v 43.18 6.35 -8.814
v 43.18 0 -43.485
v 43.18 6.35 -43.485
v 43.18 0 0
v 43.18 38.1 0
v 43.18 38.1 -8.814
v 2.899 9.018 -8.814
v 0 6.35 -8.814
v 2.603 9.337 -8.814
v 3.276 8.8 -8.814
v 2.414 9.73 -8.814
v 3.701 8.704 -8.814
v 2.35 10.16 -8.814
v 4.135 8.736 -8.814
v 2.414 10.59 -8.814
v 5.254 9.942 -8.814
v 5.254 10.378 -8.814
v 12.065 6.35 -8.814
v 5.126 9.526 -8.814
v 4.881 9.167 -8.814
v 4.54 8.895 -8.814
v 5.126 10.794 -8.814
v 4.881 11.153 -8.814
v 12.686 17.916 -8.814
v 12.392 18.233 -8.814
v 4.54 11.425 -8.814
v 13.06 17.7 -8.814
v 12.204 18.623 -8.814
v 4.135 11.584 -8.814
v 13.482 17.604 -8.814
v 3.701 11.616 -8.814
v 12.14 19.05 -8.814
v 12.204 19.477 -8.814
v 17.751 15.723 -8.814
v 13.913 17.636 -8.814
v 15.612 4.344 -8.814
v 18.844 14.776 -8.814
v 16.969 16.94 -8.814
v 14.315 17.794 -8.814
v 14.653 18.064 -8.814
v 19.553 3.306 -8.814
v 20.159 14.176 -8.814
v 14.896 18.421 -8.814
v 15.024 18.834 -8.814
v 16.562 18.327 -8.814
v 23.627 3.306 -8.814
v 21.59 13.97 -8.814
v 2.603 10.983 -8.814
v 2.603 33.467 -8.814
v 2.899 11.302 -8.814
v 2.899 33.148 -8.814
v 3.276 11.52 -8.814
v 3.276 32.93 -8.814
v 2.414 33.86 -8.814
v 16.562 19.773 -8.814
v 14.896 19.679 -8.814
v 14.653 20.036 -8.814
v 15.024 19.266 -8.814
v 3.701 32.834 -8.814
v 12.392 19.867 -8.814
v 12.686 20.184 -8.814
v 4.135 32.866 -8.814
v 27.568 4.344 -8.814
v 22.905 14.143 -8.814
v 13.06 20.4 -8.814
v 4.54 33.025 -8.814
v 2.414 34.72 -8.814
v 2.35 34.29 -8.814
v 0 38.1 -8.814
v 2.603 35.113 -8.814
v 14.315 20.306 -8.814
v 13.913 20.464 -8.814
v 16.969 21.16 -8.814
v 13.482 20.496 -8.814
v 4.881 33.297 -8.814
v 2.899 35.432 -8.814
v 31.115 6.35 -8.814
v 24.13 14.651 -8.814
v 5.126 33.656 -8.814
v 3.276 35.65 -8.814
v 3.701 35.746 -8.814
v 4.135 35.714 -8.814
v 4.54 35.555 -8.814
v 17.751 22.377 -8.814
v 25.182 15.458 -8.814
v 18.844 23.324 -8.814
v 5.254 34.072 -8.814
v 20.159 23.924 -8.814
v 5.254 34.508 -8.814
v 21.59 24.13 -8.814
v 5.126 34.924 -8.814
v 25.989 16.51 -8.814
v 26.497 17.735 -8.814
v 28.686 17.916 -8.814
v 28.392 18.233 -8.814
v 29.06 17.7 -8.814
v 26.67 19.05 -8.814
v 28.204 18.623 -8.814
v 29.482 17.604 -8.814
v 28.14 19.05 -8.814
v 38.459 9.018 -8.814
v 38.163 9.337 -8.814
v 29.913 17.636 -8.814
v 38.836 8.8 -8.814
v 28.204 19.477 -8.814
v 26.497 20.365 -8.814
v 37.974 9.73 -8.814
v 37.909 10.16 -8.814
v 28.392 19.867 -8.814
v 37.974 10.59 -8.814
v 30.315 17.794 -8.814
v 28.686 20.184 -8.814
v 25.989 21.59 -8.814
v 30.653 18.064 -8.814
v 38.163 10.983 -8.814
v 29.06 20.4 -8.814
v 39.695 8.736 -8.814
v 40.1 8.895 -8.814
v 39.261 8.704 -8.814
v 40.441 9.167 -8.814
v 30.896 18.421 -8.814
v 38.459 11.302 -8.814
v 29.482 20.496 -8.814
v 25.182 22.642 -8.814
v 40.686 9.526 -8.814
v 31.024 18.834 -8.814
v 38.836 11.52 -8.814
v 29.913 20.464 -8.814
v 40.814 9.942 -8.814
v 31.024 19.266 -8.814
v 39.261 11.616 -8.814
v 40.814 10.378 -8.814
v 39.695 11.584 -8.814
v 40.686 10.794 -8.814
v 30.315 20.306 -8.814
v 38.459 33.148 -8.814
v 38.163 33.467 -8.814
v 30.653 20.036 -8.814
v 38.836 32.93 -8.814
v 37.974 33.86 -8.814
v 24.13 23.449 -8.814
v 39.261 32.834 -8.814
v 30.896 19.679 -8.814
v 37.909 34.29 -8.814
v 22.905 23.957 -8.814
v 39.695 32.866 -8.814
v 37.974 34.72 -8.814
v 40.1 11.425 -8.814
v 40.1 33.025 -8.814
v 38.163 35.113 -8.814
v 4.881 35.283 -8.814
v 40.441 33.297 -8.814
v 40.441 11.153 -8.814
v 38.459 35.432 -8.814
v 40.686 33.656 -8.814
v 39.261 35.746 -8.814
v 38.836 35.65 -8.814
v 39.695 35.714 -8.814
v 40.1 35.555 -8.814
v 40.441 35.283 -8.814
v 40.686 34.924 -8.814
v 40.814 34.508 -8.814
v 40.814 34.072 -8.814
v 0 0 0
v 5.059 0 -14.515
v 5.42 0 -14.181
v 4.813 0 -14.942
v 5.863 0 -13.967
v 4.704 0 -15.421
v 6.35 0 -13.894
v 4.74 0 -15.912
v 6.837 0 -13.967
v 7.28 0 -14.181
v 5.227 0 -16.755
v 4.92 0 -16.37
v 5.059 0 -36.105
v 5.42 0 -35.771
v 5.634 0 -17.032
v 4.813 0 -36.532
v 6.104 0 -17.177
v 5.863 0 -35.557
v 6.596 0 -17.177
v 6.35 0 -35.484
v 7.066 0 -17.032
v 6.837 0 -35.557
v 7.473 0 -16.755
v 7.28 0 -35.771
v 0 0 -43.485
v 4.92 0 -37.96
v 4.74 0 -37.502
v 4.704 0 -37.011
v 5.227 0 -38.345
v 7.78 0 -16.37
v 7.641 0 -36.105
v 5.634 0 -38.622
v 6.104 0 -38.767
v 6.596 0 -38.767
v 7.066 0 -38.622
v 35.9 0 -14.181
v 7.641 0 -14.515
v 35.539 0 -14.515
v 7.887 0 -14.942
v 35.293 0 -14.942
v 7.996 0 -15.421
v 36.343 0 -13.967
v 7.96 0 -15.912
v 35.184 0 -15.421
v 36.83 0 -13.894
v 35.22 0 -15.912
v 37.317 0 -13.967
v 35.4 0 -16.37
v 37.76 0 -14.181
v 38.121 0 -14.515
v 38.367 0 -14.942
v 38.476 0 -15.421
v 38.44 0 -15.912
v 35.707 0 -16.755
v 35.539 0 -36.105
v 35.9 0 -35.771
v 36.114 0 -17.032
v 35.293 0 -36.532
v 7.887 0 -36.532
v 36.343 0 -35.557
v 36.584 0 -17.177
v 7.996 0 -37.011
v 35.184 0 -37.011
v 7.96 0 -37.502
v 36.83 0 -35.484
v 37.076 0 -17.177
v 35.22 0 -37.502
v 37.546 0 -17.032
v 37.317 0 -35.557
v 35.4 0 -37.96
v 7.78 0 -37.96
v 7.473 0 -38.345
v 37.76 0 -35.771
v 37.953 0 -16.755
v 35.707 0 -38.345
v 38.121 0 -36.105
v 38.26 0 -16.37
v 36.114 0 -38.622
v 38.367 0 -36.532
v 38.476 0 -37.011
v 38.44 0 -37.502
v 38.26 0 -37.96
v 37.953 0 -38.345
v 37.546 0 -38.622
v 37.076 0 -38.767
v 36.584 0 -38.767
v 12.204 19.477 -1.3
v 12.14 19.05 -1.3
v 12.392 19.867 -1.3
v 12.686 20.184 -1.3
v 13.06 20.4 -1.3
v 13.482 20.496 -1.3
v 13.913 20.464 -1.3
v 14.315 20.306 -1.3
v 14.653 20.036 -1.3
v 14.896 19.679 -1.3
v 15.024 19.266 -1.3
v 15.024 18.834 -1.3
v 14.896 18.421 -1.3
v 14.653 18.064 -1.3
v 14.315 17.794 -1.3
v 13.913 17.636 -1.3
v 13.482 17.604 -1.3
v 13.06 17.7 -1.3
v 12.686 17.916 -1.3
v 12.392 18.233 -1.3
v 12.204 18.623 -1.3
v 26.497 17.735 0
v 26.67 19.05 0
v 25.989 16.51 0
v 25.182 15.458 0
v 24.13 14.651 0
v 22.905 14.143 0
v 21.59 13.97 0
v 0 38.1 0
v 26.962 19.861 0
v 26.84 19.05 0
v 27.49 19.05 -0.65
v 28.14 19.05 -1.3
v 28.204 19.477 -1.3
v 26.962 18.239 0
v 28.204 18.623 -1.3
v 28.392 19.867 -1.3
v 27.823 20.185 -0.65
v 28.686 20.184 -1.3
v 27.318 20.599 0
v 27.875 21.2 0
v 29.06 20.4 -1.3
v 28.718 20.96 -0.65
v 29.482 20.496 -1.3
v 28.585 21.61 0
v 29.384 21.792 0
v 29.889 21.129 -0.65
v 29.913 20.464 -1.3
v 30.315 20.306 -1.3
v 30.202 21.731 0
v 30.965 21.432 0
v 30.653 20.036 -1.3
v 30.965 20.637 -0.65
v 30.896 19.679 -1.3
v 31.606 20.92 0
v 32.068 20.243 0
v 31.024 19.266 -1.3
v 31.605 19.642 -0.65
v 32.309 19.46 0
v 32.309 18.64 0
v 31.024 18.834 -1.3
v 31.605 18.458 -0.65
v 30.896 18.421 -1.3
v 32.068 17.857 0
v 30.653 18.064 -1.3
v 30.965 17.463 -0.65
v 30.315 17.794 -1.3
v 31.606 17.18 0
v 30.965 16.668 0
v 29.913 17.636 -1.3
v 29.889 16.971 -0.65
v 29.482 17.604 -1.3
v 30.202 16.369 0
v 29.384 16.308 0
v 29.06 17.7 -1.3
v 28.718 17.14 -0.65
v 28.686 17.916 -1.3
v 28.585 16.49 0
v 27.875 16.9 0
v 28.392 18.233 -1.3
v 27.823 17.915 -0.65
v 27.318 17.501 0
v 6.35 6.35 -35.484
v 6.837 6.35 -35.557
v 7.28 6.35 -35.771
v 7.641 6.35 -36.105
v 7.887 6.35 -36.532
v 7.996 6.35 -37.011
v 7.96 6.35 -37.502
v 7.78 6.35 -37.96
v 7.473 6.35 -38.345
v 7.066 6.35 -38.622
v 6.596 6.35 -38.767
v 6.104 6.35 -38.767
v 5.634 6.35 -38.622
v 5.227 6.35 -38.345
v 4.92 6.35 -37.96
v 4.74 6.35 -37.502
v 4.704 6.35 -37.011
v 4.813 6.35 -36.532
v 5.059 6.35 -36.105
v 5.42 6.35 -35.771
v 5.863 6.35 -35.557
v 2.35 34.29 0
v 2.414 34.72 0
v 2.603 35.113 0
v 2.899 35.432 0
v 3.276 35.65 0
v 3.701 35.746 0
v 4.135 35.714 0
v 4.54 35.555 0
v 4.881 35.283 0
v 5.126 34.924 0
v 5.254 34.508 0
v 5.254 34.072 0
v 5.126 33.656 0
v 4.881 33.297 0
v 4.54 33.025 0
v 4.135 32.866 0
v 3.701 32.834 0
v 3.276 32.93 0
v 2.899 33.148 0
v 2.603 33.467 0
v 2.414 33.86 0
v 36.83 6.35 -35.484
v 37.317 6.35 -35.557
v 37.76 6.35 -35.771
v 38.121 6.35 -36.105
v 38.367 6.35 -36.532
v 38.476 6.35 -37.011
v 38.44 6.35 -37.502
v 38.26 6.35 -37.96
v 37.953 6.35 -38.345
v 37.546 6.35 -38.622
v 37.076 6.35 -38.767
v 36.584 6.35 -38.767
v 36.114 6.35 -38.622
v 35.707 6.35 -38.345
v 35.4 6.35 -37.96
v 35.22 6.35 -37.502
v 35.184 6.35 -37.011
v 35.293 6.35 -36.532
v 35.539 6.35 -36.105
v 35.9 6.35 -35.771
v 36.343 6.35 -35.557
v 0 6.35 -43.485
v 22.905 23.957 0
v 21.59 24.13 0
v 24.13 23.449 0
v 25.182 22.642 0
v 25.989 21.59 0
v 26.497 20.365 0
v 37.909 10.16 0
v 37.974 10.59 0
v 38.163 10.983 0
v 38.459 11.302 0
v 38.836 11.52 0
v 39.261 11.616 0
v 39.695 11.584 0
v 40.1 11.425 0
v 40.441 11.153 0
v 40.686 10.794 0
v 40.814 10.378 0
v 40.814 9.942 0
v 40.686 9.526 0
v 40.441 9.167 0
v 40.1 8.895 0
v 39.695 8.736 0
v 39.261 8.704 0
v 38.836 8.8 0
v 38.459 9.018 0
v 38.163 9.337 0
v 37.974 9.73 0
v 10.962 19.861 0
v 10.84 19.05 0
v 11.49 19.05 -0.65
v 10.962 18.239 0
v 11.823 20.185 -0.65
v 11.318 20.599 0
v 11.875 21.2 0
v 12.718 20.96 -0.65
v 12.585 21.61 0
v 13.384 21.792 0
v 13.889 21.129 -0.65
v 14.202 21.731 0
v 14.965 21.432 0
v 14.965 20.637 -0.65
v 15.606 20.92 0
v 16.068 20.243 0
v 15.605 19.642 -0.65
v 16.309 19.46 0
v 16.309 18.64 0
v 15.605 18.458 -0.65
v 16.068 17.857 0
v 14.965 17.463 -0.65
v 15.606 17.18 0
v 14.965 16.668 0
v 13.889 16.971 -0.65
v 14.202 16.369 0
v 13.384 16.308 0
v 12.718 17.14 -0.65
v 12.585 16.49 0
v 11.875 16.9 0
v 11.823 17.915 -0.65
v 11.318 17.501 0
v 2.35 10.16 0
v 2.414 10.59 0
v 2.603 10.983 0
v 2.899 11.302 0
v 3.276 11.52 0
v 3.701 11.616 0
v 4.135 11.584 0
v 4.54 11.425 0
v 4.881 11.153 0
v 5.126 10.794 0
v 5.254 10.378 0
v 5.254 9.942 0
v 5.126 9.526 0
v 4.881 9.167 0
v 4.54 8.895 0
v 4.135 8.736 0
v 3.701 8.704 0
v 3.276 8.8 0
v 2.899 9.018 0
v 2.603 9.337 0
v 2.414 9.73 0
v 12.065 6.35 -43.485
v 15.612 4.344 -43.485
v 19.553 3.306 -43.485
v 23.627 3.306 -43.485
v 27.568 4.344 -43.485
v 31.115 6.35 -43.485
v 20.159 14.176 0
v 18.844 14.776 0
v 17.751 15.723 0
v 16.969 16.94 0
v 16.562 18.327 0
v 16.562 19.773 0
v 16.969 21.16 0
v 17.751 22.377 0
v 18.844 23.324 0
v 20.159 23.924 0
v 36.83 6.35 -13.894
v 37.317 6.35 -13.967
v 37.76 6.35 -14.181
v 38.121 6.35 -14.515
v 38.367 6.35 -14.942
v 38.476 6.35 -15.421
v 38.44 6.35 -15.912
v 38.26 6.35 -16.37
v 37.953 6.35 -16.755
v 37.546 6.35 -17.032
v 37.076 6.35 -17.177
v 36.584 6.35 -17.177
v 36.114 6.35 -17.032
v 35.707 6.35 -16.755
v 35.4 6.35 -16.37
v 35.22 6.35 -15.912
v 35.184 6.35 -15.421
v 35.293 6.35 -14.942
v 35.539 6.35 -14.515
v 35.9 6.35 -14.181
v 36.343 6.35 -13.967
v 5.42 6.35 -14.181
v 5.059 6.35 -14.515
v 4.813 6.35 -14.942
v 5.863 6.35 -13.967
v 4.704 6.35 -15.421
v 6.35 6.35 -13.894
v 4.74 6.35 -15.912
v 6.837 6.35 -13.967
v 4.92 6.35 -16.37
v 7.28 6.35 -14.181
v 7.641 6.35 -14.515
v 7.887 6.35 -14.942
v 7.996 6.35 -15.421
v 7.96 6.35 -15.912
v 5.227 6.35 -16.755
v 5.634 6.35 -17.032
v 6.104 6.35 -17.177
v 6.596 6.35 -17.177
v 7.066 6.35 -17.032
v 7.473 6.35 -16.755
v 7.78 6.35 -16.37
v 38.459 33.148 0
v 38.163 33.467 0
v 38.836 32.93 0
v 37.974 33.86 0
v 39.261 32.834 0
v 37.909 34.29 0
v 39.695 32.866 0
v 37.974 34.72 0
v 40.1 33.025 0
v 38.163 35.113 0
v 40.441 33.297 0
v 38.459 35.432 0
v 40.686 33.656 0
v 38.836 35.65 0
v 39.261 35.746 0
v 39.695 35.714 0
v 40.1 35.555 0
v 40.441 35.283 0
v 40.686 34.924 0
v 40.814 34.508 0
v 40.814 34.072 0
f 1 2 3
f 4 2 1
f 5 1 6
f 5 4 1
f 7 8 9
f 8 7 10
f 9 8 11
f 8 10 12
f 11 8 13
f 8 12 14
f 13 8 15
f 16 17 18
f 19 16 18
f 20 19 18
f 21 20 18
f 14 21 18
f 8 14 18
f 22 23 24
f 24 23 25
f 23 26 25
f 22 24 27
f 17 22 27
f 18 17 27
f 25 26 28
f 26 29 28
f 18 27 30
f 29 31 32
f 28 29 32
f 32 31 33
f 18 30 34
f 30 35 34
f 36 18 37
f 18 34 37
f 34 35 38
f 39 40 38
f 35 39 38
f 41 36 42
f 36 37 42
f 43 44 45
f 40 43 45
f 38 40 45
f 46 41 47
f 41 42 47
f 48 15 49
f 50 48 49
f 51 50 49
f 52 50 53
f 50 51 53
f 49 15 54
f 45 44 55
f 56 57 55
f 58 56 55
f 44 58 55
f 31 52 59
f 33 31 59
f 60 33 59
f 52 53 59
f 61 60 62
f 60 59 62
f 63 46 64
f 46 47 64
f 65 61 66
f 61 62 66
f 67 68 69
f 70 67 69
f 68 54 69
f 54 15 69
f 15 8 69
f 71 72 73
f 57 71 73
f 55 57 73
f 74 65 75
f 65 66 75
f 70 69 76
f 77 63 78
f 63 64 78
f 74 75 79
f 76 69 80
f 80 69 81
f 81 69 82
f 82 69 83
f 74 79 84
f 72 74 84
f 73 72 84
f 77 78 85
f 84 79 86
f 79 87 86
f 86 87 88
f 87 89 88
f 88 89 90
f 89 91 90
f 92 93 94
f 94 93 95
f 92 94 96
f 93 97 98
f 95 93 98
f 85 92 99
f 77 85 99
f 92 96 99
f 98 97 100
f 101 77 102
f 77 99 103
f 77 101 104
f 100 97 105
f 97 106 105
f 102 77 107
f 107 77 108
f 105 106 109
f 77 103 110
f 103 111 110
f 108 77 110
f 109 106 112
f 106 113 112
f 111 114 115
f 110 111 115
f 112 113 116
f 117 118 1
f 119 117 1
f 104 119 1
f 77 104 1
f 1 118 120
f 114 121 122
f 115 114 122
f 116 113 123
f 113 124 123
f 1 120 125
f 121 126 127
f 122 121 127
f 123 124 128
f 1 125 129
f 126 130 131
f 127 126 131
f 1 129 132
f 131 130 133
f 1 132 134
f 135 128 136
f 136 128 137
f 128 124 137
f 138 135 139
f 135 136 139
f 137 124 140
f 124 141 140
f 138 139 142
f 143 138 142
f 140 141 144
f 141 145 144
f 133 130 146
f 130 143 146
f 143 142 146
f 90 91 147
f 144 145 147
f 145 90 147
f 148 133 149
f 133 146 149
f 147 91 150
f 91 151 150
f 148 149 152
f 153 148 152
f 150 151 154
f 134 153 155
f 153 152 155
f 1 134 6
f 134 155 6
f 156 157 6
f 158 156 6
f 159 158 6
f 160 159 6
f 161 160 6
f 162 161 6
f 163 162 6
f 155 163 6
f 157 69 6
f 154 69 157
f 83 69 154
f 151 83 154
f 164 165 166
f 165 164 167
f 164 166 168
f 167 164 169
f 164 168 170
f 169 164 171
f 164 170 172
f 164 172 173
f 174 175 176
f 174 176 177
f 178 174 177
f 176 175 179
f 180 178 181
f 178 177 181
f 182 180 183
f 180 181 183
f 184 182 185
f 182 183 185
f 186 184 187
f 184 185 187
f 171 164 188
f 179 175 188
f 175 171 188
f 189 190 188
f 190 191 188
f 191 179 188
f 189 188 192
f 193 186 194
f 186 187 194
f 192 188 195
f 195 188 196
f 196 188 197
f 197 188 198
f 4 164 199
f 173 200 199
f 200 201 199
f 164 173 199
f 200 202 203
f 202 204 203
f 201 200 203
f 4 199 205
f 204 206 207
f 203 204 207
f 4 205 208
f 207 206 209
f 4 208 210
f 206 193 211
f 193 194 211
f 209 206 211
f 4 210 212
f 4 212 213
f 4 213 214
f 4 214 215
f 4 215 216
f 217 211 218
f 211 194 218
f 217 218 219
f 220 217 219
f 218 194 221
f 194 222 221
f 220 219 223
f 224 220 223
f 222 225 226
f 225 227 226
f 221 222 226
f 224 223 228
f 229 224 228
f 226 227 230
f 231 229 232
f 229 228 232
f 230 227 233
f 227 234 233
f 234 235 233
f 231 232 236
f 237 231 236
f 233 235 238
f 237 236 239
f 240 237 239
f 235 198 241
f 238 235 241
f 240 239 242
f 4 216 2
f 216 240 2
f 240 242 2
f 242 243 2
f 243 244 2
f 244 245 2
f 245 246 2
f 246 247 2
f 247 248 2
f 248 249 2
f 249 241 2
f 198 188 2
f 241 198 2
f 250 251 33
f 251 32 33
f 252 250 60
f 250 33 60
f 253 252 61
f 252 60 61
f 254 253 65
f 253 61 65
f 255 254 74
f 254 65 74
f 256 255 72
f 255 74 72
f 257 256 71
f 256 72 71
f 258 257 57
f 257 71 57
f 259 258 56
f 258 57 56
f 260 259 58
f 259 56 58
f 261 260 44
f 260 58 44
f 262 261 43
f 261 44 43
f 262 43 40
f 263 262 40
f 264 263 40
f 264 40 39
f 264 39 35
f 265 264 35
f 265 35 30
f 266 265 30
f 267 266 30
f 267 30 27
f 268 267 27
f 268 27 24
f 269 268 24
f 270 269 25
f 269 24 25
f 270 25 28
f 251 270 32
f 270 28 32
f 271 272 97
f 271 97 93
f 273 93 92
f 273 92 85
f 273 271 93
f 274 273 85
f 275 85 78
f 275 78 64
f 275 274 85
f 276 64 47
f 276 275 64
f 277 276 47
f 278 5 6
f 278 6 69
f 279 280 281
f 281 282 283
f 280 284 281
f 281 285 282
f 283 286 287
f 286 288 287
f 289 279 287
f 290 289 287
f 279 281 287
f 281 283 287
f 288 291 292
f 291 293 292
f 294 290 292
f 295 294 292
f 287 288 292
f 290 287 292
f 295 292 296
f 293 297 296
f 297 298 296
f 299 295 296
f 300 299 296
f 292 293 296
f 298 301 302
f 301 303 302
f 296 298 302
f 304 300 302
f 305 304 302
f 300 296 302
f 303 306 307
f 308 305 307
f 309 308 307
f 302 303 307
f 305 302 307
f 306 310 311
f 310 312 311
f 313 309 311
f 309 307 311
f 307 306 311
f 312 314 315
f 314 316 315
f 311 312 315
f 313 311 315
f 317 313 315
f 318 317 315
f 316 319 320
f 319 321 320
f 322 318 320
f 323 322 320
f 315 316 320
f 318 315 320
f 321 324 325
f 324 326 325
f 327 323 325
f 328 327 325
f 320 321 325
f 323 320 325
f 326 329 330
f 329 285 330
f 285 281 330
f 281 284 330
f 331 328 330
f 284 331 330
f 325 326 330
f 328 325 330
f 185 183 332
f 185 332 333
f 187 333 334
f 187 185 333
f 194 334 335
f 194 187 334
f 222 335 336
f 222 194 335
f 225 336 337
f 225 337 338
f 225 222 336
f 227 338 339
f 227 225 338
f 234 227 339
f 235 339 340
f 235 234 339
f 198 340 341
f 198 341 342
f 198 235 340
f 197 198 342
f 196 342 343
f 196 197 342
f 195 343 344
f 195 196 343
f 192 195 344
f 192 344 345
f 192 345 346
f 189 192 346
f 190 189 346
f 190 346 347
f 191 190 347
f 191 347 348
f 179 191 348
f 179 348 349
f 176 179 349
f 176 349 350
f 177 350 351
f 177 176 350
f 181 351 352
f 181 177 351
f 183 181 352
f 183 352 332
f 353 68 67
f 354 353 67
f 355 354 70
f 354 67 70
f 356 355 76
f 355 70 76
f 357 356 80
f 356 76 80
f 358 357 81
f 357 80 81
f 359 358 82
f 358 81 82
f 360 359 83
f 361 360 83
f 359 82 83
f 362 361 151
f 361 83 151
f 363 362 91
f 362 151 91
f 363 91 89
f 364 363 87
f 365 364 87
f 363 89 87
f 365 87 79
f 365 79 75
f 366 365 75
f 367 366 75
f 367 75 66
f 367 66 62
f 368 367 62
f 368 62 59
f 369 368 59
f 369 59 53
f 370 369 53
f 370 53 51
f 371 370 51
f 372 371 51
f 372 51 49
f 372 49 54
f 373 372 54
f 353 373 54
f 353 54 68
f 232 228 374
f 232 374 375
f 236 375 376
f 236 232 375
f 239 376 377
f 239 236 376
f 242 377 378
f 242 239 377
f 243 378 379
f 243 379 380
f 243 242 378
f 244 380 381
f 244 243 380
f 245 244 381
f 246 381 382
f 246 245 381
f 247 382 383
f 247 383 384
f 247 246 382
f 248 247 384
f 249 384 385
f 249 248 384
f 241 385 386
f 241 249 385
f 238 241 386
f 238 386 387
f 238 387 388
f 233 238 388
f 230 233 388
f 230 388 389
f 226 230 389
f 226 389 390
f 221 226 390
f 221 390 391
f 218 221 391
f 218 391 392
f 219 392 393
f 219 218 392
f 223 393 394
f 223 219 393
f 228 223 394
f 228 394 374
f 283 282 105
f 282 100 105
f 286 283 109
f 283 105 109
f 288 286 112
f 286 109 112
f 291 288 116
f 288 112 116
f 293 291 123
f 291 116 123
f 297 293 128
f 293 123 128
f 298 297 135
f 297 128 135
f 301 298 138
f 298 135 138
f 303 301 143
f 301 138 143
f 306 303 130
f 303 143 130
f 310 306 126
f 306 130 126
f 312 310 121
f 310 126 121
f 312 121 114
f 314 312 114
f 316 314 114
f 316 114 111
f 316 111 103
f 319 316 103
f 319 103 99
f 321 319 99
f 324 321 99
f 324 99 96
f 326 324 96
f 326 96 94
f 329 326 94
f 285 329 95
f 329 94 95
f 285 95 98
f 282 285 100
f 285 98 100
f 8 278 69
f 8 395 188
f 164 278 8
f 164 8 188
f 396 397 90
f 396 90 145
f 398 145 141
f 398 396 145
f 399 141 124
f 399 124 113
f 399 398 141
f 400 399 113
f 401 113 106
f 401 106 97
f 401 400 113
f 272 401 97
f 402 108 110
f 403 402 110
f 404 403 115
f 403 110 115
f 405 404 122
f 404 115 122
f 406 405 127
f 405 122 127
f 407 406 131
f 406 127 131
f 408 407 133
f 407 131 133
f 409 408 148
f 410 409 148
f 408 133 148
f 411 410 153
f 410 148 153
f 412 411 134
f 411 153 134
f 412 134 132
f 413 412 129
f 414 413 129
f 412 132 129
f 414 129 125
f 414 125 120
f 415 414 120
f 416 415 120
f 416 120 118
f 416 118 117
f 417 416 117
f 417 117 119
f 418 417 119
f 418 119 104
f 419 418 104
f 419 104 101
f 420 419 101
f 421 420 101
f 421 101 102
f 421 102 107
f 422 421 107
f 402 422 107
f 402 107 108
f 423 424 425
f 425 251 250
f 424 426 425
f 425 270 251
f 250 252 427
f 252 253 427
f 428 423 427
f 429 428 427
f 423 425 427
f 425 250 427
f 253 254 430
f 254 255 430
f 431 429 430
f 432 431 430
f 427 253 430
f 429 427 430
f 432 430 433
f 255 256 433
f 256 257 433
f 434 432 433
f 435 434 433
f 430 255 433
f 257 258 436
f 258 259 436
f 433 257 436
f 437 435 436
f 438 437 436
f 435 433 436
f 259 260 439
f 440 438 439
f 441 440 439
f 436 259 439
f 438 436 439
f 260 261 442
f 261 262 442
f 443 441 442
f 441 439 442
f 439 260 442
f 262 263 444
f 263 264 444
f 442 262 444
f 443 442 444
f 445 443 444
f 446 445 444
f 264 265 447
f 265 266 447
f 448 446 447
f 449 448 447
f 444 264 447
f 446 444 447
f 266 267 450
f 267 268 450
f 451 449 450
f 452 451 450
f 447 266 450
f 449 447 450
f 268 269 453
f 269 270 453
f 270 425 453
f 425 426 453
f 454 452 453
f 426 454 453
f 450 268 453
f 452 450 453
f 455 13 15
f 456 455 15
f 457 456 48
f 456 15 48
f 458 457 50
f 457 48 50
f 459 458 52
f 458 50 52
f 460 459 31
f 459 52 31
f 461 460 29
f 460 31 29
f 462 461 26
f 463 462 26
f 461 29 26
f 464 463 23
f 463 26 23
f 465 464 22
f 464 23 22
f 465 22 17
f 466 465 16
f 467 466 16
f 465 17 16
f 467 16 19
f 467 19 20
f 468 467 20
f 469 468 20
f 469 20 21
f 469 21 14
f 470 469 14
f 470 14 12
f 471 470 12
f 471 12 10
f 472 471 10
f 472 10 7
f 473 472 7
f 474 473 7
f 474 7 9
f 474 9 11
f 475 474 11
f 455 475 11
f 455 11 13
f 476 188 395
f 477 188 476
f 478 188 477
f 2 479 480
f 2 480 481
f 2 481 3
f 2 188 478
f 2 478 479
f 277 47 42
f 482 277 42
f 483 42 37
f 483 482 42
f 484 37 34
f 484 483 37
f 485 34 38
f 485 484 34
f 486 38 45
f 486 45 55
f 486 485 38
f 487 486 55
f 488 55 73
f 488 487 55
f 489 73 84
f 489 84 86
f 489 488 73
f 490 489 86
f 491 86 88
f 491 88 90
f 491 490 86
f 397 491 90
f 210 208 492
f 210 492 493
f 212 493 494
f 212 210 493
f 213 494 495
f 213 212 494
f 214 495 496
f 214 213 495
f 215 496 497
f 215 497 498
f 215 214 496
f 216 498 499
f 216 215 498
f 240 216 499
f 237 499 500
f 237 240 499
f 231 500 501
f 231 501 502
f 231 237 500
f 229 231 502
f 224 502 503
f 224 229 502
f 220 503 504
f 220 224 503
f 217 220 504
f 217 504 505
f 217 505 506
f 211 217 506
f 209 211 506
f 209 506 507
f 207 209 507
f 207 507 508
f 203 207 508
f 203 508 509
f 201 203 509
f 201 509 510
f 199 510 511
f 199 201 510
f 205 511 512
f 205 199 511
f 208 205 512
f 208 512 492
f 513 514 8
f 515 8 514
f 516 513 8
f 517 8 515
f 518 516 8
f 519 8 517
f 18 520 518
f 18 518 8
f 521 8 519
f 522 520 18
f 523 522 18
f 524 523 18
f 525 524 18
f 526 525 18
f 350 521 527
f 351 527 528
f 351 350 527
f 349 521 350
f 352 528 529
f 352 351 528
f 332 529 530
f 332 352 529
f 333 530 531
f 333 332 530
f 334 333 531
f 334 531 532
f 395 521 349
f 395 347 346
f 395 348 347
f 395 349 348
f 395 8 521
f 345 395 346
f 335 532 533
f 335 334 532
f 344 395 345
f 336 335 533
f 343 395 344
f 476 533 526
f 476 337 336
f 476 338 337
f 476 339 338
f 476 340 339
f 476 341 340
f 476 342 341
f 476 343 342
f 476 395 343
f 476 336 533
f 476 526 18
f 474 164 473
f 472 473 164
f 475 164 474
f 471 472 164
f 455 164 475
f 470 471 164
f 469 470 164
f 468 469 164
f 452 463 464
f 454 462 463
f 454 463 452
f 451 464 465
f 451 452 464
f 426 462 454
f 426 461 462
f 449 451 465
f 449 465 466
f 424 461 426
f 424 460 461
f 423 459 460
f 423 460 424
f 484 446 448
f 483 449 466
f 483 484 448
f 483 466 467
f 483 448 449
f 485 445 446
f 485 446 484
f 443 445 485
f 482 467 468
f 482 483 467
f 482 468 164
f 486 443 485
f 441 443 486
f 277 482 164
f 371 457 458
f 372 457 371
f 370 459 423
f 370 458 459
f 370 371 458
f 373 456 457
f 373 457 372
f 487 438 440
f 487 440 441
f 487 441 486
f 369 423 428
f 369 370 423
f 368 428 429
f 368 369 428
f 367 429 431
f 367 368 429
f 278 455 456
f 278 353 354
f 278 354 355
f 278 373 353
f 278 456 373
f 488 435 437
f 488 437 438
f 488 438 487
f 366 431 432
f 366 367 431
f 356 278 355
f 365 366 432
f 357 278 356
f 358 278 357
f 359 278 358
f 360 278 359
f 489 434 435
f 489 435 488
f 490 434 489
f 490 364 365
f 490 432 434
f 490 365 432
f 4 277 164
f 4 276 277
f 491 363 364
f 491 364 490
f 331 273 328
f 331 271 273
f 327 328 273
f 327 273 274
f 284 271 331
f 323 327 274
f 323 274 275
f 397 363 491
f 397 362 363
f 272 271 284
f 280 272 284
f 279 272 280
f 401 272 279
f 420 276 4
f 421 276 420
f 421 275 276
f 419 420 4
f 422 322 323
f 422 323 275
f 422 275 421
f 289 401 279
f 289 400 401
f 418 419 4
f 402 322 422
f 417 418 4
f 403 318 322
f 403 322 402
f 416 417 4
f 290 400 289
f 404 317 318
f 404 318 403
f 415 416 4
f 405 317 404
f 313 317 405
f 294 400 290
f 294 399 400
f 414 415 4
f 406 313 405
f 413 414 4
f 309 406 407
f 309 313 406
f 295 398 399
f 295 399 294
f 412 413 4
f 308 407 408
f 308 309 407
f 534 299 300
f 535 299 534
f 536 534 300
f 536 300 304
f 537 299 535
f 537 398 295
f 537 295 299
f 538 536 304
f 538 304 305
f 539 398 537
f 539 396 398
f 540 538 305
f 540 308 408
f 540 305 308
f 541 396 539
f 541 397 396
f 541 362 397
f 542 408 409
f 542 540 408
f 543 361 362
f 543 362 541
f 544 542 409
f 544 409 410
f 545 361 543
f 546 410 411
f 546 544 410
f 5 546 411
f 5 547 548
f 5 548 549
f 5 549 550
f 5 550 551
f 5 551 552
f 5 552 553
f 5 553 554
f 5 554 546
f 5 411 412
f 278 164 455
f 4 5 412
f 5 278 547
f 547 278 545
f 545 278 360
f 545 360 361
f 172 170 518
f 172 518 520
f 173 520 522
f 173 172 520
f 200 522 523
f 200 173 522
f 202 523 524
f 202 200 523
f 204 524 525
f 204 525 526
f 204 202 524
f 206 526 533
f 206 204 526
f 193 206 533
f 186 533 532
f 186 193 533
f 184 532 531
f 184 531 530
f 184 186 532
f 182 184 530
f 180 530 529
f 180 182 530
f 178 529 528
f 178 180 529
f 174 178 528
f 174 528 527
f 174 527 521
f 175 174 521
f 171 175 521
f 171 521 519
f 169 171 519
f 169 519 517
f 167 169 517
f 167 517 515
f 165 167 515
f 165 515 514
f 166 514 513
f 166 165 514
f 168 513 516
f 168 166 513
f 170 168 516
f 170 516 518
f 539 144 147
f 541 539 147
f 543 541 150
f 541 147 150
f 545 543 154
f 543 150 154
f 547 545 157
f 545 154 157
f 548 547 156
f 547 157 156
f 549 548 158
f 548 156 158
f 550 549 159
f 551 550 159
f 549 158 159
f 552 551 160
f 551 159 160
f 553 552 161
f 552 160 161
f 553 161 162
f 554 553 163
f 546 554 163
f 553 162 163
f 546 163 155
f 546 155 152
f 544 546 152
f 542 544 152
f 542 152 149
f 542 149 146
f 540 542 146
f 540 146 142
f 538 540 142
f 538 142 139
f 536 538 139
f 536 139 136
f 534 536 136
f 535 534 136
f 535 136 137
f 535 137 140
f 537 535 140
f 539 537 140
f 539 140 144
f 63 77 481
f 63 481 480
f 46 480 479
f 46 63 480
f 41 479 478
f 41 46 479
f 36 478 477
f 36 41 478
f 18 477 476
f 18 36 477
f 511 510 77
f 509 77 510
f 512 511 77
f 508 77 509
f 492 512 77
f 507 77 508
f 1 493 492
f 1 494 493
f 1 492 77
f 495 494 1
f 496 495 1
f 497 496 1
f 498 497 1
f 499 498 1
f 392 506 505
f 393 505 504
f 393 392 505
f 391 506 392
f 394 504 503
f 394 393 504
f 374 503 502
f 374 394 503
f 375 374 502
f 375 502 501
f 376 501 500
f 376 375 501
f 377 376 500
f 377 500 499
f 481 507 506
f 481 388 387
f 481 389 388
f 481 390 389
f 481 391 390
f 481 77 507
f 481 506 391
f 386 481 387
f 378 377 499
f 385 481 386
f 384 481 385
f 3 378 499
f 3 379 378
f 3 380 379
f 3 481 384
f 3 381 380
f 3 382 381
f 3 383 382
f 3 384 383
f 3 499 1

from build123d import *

# Parameters (mm, degrees)
SKETCH1_W                                         = 43.18
SKETCH1_H                                         = 43.4848
SKETCH1_R                                         = 1.651
BASE_LEG_DEPTH                                    = 6.35
SKETCH3_R                                         = 2.286
PERPENDICULAR_LEG_DEPTH                           = 8.8138
CSK_FOR_M2_5_FLAT_HEAD_MACHINE_SCREW1_D           = 2.9
CSK_FOR_M2_5_FLAT_HEAD_MACHINE_SCREW1_CSINK_D     = 5.5
CSK_FOR_M2_5_FLAT_HEAD_MACHINE_SCREW1_CSINK_ANGLE = 90
SKETCH10_R                                        = 1.4605
HOLES_FOR_STABILIZING_THROUGH_SHAFT_DEPTH         = 68.217561998
SKETCH11_R                                        = 15.875
CUT_EXTRUDE1_DEPTH                                = 68.217561998


with BuildPart() as part:
    # Sketch1 → Base leg (new body)
    with BuildSketch(Plane(origin=(0, 0, 0), x_dir=(1, 0, 0), z_dir=(0, 1, 0))):
        with Locations((21.59, 21.7424)):
            Rectangle(SKETCH1_W, SKETCH1_H)
        with Locations(Location((6.35, 37.1348, 0), (0, 0, 270))):
            Circle(SKETCH1_R, mode=Mode.SUBTRACT)
        with Locations(Location((36.83, 37.1348, 0), (0, 0, 270))):
            Circle(SKETCH1_R, mode=Mode.SUBTRACT)
        with Locations(Location((36.83, 15.5448, 0), (0, 0, 270))):
            Circle(SKETCH1_R, mode=Mode.SUBTRACT)
        with Locations(Location((6.35, 15.5448, 0), (0, 0, 270))):
            Circle(SKETCH1_R, mode=Mode.SUBTRACT)
    extrude(amount=BASE_LEG_DEPTH)

    # Sketch3 → Perpendicular leg (add)
    # profile 1 of 3: a face of its own
    with BuildSketch(Plane.XY):
        with BuildLine():
            Line((0, 6.35), (21.59, 6.35))
            Line((21.59, 6.35), (21.59, 13.97))
            ThreePointArc((21.59, 13.97), (16.51, 19.05), (21.59, 24.13))
            Line((21.59, 24.13), (21.59, 38.1))
            Line((21.59, 38.1), (0, 38.1))
            Line((0, 38.1), (0, 6.35))
        make_face()
        with Locations((3.302, 19.05)):
            Circle(SKETCH3_R, mode=Mode.SUBTRACT)
    # profile 2 of 3: a face of its own
    with BuildSketch(Plane.XY):
        with Locations((3.302, 19.05)):
            Circle(SKETCH3_R)
    # profile 3 of 3: a face of its own
    with BuildSketch(Plane.XY):
        with BuildLine():
            Line((21.59, 13.97), (21.59, 6.35))
            Line((21.59, 6.35), (43.18, 6.35))
            Line((43.18, 6.35), (43.18, 38.1))
            Line((43.18, 38.1), (21.59, 38.1))
            Line((21.59, 38.1), (21.59, 24.13))
            ThreePointArc((21.59, 24.13), (25.182102448, 22.642102448), (26.67, 19.05))
            ThreePointArc((26.67, 19.05), (25.182102448, 15.457897552), (21.59, 13.97))
        make_face()
    extrude(amount=-PERPENDICULAR_LEG_DEPTH)

    # CSK for M2.5 Flat Head Machine Screw1 (through all)
    with Locations(Plane.XY):
        with Locations((13.5900033, 19.05), (29.5899967, 19.05)):
            CounterSinkHole(CSK_FOR_M2_5_FLAT_HEAD_MACHINE_SCREW1_D / 2, CSK_FOR_M2_5_FLAT_HEAD_MACHINE_SCREW1_CSINK_D / 2, counter_sink_angle=CSK_FOR_M2_5_FLAT_HEAD_MACHINE_SCREW1_CSINK_ANGLE)

    # Sketch10 → Holes for stabilizing through shaft (cut, through all)
    with BuildSketch(Plane(origin=(0, 0, -8.8138), x_dir=(-1, 0, 0), z_dir=(0, 0, -1))):
        with Locations((-39.37, 34.29)):
            Circle(SKETCH10_R)
        with Locations((-39.37, 10.16)):
            Circle(SKETCH10_R)
        with Locations((-3.81, 34.29)):
            Circle(SKETCH10_R)
        with Locations((-3.81, 10.16)):
            Circle(SKETCH10_R)
    extrude(amount=-HOLES_FOR_STABILIZING_THROUGH_SHAFT_DEPTH, mode=Mode.SUBTRACT)

    # Sketch11 → Cut-Extrude1 (cut, through all)
    with BuildSketch(Plane(origin=(0, 0, -8.8138), x_dir=(-1, 0, 0), z_dir=(0, 0, -1))):
        with Locations((-21.59, 19.05)):
            Circle(SKETCH11_R)
    extrude(amount=CUT_EXTRUDE1_DEPTH, mode=Mode.SUBTRACT)


solid = part.part
